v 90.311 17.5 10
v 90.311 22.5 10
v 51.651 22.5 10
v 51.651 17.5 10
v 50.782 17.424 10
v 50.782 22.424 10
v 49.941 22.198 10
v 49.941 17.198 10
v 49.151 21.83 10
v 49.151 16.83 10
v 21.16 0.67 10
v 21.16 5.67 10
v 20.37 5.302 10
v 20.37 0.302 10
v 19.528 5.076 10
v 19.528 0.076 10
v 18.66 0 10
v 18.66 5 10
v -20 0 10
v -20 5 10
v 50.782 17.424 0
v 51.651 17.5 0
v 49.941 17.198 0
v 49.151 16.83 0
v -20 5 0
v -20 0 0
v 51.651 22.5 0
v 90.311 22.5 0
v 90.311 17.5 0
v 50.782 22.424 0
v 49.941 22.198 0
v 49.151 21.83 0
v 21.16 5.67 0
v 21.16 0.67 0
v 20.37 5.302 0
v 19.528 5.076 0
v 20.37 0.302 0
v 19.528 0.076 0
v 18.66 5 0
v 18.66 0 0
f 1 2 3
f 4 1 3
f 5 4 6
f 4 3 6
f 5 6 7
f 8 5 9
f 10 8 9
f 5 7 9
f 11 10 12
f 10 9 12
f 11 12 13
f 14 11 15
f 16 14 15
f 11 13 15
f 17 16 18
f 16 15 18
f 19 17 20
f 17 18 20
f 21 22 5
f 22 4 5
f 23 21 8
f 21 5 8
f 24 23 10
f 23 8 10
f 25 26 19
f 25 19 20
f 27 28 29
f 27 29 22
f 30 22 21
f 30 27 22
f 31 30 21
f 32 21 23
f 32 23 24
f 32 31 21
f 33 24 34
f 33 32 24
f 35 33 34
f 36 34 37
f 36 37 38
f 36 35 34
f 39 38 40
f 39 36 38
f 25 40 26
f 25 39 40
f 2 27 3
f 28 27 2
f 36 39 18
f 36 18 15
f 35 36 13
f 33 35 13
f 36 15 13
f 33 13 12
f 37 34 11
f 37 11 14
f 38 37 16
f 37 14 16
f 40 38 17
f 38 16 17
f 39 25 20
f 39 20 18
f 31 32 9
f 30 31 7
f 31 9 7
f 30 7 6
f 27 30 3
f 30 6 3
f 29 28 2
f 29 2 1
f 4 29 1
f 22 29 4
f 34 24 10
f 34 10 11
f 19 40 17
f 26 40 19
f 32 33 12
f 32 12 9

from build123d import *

# Parameters (mm, degrees)
BOSS_EXTRU_1_DEPTH = 10
CONG_1_R           = 5


with BuildPart() as part:
    # Esquisse1 → Boss.-Extru.1 (new body)
    with BuildSketch(Plane.XY):
        Polygon((-20, 5), (20, 5), (50.310889132, 22.5), (90.310889132, 22.5), (90.310889132, 17.5), (50.310889132, 17.5), (20, 0), (-20, 0), align=None)
    extrude(amount=BOSS_EXTRU_1_DEPTH)

    # Congé1
    cong_1_edges = [part.edges().sort_by_distance(p)[0] for p in [
        (20, 0, 5),
        (50.310889132, 17.5, 5),
        (50.310889132, 22.5, 5),
        (20, 5, 5),
    ]]
    fillet(cong_1_edges, radius=CONG_1_R)


solid = part.part
